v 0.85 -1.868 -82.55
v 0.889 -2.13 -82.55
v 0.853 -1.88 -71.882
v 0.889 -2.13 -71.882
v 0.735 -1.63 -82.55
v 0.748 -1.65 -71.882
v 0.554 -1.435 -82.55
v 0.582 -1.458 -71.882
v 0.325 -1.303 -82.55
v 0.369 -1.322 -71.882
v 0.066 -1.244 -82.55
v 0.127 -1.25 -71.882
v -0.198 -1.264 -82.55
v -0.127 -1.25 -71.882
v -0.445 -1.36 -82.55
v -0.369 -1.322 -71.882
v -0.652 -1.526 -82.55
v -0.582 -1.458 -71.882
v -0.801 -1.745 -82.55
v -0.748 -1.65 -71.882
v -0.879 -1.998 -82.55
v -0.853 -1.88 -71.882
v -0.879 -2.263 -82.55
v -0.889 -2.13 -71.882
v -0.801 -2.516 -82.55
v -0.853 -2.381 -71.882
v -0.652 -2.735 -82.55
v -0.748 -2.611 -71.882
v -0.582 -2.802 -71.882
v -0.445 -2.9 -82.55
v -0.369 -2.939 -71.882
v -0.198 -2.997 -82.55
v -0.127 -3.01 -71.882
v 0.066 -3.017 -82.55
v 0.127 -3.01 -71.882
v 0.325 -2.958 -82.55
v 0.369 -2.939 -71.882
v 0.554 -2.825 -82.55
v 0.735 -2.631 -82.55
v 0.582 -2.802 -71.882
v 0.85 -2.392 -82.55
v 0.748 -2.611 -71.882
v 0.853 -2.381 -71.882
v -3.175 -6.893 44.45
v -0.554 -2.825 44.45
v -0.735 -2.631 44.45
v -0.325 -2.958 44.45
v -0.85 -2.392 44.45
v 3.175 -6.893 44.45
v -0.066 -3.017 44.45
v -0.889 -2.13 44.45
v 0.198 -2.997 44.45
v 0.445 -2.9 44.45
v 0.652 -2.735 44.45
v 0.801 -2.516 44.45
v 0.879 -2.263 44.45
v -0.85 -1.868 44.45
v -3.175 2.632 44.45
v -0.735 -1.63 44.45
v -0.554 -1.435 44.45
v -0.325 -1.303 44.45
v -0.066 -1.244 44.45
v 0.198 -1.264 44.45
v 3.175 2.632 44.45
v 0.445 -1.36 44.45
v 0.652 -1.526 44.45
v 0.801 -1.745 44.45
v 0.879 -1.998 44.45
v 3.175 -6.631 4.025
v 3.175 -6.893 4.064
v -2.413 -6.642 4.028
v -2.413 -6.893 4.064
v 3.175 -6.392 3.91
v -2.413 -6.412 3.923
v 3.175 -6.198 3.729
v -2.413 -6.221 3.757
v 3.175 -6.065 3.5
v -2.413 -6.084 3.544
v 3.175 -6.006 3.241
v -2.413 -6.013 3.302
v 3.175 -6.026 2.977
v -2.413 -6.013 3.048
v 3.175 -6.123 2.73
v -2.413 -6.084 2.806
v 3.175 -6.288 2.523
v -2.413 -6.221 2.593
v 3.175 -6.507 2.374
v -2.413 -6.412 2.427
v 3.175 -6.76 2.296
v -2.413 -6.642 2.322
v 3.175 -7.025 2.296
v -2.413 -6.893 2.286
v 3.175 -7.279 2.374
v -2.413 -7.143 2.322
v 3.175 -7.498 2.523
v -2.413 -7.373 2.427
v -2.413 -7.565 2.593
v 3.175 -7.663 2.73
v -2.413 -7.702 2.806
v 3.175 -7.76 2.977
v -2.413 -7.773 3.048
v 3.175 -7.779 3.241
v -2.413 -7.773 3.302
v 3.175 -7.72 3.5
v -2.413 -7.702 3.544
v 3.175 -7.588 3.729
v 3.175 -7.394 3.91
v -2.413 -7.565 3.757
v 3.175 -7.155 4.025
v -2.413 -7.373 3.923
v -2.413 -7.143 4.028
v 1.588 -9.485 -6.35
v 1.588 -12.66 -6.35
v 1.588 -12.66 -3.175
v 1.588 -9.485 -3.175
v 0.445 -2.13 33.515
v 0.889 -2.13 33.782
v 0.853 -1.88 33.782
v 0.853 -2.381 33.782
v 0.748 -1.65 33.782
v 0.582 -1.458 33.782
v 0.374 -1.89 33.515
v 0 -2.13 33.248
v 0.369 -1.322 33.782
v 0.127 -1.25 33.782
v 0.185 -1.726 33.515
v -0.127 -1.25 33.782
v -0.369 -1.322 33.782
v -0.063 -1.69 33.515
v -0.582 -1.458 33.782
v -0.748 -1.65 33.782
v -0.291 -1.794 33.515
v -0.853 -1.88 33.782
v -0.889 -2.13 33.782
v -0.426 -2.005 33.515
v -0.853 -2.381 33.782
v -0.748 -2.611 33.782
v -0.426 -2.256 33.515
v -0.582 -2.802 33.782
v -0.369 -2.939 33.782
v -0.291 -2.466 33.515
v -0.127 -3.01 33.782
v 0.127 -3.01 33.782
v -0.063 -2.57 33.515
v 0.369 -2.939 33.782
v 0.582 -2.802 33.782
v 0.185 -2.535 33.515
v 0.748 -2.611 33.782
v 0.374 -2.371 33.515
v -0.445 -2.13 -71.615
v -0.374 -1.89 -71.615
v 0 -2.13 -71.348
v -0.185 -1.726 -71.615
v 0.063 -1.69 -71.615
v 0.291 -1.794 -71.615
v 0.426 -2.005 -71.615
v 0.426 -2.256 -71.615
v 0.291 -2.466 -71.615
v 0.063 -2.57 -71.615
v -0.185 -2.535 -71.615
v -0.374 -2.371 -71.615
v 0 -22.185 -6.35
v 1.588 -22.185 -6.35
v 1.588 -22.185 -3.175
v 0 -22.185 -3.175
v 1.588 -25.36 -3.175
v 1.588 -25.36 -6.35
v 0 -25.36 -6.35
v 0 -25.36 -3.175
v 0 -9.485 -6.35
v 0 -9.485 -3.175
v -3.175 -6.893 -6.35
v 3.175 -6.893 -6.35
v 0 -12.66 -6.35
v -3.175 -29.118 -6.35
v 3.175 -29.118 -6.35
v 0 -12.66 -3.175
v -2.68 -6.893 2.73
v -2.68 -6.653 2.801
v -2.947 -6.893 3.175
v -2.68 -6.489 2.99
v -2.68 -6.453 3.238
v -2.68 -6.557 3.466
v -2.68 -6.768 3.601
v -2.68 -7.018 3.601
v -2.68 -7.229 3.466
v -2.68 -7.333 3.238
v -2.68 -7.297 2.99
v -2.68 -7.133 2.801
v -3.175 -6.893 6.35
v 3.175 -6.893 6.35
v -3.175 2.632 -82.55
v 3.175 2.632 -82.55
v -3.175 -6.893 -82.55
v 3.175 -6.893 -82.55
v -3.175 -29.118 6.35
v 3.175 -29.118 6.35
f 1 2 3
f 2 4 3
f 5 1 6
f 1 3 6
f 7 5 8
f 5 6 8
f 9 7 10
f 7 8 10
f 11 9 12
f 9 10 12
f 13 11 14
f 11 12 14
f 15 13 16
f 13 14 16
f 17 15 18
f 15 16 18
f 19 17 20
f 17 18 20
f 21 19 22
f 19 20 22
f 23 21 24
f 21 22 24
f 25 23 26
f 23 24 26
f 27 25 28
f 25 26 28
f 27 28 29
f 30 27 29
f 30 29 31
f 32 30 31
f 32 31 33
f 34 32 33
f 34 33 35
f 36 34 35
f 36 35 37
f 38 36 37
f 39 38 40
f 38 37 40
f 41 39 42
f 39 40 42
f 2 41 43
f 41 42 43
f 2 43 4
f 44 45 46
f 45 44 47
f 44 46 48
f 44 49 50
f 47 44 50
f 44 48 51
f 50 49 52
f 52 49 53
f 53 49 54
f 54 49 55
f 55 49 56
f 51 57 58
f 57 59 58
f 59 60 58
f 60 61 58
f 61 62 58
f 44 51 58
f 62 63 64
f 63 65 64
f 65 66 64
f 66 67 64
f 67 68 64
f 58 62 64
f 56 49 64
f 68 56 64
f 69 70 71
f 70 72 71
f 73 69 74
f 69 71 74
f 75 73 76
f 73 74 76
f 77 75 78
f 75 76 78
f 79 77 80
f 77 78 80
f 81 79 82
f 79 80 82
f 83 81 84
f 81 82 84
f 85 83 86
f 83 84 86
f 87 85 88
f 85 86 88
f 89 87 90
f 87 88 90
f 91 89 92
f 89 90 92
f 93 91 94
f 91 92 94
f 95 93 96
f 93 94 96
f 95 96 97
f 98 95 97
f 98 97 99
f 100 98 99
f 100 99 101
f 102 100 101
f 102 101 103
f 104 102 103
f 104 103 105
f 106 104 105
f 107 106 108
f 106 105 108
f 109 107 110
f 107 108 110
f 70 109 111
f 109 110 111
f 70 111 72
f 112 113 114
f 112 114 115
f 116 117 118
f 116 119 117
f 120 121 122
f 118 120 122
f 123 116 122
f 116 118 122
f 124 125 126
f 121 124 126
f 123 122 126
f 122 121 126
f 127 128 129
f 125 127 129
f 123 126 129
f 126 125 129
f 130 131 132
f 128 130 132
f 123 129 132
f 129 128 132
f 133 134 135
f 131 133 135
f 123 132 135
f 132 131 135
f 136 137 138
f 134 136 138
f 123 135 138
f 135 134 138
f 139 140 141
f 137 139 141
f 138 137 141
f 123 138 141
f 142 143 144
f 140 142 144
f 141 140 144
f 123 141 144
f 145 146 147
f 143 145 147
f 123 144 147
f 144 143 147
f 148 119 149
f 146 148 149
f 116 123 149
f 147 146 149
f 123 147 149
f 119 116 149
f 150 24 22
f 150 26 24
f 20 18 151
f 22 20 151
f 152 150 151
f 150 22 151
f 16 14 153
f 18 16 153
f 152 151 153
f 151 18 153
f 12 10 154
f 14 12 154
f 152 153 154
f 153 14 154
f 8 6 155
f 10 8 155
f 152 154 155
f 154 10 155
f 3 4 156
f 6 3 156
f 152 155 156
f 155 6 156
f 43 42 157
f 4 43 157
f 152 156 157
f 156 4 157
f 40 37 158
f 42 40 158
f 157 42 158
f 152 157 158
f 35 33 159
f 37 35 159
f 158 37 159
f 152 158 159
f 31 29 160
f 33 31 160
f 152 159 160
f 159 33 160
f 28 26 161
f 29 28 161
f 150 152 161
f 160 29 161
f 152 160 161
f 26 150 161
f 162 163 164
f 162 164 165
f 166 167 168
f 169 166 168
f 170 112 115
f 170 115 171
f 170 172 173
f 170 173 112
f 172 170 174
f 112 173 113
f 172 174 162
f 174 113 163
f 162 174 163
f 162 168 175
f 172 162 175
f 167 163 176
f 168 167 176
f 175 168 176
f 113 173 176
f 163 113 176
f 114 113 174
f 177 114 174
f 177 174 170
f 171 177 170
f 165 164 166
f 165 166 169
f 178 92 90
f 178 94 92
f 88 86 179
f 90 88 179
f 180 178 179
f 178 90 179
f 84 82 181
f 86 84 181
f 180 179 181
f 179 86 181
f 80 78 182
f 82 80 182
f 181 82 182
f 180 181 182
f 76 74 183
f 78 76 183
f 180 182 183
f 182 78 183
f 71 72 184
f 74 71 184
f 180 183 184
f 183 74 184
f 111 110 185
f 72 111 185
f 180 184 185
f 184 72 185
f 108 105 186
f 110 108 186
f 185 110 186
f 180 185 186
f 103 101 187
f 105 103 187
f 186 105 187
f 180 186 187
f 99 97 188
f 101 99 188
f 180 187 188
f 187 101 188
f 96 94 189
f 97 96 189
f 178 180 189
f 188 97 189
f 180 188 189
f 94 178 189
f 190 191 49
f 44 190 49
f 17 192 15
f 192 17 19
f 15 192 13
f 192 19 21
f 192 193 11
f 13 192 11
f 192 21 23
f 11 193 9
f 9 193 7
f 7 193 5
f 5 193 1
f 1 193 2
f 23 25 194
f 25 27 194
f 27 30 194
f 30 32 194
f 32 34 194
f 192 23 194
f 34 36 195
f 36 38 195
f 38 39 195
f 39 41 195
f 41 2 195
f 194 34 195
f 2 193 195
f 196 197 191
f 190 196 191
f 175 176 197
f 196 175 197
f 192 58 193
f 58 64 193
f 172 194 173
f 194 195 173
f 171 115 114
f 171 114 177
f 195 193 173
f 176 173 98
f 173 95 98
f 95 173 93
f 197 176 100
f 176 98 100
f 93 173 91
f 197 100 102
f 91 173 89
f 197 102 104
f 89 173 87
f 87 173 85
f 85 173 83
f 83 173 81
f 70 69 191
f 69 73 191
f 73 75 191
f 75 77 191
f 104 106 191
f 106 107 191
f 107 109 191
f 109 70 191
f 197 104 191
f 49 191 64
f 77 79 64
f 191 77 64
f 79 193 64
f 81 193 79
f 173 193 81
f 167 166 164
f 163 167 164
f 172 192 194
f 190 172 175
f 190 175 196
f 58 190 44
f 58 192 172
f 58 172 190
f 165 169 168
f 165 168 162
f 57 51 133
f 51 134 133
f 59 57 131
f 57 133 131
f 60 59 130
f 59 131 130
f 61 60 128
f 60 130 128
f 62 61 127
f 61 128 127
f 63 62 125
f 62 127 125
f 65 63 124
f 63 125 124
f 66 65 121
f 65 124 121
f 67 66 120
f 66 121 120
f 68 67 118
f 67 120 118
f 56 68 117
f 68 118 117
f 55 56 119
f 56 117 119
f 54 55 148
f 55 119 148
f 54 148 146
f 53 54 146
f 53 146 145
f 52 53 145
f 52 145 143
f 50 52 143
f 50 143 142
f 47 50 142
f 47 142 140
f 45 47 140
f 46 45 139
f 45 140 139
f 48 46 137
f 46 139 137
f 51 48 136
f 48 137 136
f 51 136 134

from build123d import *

# Parameters (mm, degrees)
BOSS_EXTRUDE1_DEPTH       = 3.175
SKETCH2_W                 = 1.5875
SKETCH2_H                 = 3.175
CUT_EXTRUDE1_DEPTH        = 3.175
F_2_56_TAPPED_HOLE1_D     = 1.778
F_2_56_TAPPED_HOLE1_DEPTH = 5.588
F_2_56_TAPPED_HOLE1_TIP   = 0.53416509
F_2_56_TAPPED_HOLE2_D     = 1.778
F_2_56_TAPPED_HOLE2_DEPTH = 10.668
F_2_56_TAPPED_HOLE2_TIP   = 0.53416509
F_2_56_TAPPED_HOLE3_D     = 1.778
F_2_56_TAPPED_HOLE3_DEPTH = 10.668
F_2_56_TAPPED_HOLE3_TIP   = 0.53416509


with BuildPart() as part:
    # Sketch1 → Boss-Extrude1 (new body, symmetric)
    with BuildSketch(Plane(origin=(0, 0, 0), x_dir=(0, 0, -1), z_dir=(1, 0, 0))):
        Polygon((-6.35, -6.892849115), (-44.45, -6.892849115), (-44.45, 2.632150885), (82.55, 2.632150885), (82.55, -6.892849115), (6.35, -6.892849115), (6.35, -29.117849115), (-6.35, -29.117849115), align=None)
    extrude(amount=BOSS_EXTRUDE1_DEPTH, both=True)

    # Sketch2 → Cut-Extrude1 (cut)
    with BuildSketch(Plane(origin=(0, 0, -6.35), x_dir=(-1, 0, 0), z_dir=(0, 0, -1))):
        with Locations((-0.79375, -11.072771518)):
            Rectangle(SKETCH2_W, SKETCH2_H)
        with Locations((-0.79375, -23.772771518)):
            Rectangle(SKETCH2_W, SKETCH2_H)
    extrude(amount=-CUT_EXTRUDE1_DEPTH, mode=Mode.SUBTRACT)

    # #2-56 Tapped Hole1
    with Locations(Plane(origin=(3.175, 0, 0), x_dir=(0, 0, -1), z_dir=(1, 0, 0))):
        with Locations((-3.175, -6.892849115)):
            Hole(F_2_56_TAPPED_HOLE1_D / 2, depth=F_2_56_TAPPED_HOLE1_DEPTH)
            with Locations((0, 0, -(F_2_56_TAPPED_HOLE1_DEPTH + F_2_56_TAPPED_HOLE1_TIP / 2))):  # 118° drill point
                Cone(0, F_2_56_TAPPED_HOLE1_D / 2, F_2_56_TAPPED_HOLE1_TIP, mode=Mode.SUBTRACT)

    # #2-56 Tapped Hole2
    with Locations(Plane.XY.offset(44.45)):
        with Locations((0, -2.130349115)):
            Hole(F_2_56_TAPPED_HOLE2_D / 2, depth=F_2_56_TAPPED_HOLE2_DEPTH)
            with Locations((0, 0, -(F_2_56_TAPPED_HOLE2_DEPTH + F_2_56_TAPPED_HOLE2_TIP / 2))):  # 118° drill point
                Cone(0, F_2_56_TAPPED_HOLE2_D / 2, F_2_56_TAPPED_HOLE2_TIP, mode=Mode.SUBTRACT)

    # #2-56 Tapped Hole3
    with Locations(Plane(origin=(0, 0, -82.55), x_dir=(-1, 0, 0), z_dir=(0, 0, -1))):
        with Locations((0, -2.130349115)):
            Hole(F_2_56_TAPPED_HOLE3_D / 2, depth=F_2_56_TAPPED_HOLE3_DEPTH)
            with Locations((0, 0, -(F_2_56_TAPPED_HOLE3_DEPTH + F_2_56_TAPPED_HOLE3_TIP / 2))):  # 118° drill point
                Cone(0, F_2_56_TAPPED_HOLE3_D / 2, F_2_56_TAPPED_HOLE3_TIP, mode=Mode.SUBTRACT)


solid = part.part
